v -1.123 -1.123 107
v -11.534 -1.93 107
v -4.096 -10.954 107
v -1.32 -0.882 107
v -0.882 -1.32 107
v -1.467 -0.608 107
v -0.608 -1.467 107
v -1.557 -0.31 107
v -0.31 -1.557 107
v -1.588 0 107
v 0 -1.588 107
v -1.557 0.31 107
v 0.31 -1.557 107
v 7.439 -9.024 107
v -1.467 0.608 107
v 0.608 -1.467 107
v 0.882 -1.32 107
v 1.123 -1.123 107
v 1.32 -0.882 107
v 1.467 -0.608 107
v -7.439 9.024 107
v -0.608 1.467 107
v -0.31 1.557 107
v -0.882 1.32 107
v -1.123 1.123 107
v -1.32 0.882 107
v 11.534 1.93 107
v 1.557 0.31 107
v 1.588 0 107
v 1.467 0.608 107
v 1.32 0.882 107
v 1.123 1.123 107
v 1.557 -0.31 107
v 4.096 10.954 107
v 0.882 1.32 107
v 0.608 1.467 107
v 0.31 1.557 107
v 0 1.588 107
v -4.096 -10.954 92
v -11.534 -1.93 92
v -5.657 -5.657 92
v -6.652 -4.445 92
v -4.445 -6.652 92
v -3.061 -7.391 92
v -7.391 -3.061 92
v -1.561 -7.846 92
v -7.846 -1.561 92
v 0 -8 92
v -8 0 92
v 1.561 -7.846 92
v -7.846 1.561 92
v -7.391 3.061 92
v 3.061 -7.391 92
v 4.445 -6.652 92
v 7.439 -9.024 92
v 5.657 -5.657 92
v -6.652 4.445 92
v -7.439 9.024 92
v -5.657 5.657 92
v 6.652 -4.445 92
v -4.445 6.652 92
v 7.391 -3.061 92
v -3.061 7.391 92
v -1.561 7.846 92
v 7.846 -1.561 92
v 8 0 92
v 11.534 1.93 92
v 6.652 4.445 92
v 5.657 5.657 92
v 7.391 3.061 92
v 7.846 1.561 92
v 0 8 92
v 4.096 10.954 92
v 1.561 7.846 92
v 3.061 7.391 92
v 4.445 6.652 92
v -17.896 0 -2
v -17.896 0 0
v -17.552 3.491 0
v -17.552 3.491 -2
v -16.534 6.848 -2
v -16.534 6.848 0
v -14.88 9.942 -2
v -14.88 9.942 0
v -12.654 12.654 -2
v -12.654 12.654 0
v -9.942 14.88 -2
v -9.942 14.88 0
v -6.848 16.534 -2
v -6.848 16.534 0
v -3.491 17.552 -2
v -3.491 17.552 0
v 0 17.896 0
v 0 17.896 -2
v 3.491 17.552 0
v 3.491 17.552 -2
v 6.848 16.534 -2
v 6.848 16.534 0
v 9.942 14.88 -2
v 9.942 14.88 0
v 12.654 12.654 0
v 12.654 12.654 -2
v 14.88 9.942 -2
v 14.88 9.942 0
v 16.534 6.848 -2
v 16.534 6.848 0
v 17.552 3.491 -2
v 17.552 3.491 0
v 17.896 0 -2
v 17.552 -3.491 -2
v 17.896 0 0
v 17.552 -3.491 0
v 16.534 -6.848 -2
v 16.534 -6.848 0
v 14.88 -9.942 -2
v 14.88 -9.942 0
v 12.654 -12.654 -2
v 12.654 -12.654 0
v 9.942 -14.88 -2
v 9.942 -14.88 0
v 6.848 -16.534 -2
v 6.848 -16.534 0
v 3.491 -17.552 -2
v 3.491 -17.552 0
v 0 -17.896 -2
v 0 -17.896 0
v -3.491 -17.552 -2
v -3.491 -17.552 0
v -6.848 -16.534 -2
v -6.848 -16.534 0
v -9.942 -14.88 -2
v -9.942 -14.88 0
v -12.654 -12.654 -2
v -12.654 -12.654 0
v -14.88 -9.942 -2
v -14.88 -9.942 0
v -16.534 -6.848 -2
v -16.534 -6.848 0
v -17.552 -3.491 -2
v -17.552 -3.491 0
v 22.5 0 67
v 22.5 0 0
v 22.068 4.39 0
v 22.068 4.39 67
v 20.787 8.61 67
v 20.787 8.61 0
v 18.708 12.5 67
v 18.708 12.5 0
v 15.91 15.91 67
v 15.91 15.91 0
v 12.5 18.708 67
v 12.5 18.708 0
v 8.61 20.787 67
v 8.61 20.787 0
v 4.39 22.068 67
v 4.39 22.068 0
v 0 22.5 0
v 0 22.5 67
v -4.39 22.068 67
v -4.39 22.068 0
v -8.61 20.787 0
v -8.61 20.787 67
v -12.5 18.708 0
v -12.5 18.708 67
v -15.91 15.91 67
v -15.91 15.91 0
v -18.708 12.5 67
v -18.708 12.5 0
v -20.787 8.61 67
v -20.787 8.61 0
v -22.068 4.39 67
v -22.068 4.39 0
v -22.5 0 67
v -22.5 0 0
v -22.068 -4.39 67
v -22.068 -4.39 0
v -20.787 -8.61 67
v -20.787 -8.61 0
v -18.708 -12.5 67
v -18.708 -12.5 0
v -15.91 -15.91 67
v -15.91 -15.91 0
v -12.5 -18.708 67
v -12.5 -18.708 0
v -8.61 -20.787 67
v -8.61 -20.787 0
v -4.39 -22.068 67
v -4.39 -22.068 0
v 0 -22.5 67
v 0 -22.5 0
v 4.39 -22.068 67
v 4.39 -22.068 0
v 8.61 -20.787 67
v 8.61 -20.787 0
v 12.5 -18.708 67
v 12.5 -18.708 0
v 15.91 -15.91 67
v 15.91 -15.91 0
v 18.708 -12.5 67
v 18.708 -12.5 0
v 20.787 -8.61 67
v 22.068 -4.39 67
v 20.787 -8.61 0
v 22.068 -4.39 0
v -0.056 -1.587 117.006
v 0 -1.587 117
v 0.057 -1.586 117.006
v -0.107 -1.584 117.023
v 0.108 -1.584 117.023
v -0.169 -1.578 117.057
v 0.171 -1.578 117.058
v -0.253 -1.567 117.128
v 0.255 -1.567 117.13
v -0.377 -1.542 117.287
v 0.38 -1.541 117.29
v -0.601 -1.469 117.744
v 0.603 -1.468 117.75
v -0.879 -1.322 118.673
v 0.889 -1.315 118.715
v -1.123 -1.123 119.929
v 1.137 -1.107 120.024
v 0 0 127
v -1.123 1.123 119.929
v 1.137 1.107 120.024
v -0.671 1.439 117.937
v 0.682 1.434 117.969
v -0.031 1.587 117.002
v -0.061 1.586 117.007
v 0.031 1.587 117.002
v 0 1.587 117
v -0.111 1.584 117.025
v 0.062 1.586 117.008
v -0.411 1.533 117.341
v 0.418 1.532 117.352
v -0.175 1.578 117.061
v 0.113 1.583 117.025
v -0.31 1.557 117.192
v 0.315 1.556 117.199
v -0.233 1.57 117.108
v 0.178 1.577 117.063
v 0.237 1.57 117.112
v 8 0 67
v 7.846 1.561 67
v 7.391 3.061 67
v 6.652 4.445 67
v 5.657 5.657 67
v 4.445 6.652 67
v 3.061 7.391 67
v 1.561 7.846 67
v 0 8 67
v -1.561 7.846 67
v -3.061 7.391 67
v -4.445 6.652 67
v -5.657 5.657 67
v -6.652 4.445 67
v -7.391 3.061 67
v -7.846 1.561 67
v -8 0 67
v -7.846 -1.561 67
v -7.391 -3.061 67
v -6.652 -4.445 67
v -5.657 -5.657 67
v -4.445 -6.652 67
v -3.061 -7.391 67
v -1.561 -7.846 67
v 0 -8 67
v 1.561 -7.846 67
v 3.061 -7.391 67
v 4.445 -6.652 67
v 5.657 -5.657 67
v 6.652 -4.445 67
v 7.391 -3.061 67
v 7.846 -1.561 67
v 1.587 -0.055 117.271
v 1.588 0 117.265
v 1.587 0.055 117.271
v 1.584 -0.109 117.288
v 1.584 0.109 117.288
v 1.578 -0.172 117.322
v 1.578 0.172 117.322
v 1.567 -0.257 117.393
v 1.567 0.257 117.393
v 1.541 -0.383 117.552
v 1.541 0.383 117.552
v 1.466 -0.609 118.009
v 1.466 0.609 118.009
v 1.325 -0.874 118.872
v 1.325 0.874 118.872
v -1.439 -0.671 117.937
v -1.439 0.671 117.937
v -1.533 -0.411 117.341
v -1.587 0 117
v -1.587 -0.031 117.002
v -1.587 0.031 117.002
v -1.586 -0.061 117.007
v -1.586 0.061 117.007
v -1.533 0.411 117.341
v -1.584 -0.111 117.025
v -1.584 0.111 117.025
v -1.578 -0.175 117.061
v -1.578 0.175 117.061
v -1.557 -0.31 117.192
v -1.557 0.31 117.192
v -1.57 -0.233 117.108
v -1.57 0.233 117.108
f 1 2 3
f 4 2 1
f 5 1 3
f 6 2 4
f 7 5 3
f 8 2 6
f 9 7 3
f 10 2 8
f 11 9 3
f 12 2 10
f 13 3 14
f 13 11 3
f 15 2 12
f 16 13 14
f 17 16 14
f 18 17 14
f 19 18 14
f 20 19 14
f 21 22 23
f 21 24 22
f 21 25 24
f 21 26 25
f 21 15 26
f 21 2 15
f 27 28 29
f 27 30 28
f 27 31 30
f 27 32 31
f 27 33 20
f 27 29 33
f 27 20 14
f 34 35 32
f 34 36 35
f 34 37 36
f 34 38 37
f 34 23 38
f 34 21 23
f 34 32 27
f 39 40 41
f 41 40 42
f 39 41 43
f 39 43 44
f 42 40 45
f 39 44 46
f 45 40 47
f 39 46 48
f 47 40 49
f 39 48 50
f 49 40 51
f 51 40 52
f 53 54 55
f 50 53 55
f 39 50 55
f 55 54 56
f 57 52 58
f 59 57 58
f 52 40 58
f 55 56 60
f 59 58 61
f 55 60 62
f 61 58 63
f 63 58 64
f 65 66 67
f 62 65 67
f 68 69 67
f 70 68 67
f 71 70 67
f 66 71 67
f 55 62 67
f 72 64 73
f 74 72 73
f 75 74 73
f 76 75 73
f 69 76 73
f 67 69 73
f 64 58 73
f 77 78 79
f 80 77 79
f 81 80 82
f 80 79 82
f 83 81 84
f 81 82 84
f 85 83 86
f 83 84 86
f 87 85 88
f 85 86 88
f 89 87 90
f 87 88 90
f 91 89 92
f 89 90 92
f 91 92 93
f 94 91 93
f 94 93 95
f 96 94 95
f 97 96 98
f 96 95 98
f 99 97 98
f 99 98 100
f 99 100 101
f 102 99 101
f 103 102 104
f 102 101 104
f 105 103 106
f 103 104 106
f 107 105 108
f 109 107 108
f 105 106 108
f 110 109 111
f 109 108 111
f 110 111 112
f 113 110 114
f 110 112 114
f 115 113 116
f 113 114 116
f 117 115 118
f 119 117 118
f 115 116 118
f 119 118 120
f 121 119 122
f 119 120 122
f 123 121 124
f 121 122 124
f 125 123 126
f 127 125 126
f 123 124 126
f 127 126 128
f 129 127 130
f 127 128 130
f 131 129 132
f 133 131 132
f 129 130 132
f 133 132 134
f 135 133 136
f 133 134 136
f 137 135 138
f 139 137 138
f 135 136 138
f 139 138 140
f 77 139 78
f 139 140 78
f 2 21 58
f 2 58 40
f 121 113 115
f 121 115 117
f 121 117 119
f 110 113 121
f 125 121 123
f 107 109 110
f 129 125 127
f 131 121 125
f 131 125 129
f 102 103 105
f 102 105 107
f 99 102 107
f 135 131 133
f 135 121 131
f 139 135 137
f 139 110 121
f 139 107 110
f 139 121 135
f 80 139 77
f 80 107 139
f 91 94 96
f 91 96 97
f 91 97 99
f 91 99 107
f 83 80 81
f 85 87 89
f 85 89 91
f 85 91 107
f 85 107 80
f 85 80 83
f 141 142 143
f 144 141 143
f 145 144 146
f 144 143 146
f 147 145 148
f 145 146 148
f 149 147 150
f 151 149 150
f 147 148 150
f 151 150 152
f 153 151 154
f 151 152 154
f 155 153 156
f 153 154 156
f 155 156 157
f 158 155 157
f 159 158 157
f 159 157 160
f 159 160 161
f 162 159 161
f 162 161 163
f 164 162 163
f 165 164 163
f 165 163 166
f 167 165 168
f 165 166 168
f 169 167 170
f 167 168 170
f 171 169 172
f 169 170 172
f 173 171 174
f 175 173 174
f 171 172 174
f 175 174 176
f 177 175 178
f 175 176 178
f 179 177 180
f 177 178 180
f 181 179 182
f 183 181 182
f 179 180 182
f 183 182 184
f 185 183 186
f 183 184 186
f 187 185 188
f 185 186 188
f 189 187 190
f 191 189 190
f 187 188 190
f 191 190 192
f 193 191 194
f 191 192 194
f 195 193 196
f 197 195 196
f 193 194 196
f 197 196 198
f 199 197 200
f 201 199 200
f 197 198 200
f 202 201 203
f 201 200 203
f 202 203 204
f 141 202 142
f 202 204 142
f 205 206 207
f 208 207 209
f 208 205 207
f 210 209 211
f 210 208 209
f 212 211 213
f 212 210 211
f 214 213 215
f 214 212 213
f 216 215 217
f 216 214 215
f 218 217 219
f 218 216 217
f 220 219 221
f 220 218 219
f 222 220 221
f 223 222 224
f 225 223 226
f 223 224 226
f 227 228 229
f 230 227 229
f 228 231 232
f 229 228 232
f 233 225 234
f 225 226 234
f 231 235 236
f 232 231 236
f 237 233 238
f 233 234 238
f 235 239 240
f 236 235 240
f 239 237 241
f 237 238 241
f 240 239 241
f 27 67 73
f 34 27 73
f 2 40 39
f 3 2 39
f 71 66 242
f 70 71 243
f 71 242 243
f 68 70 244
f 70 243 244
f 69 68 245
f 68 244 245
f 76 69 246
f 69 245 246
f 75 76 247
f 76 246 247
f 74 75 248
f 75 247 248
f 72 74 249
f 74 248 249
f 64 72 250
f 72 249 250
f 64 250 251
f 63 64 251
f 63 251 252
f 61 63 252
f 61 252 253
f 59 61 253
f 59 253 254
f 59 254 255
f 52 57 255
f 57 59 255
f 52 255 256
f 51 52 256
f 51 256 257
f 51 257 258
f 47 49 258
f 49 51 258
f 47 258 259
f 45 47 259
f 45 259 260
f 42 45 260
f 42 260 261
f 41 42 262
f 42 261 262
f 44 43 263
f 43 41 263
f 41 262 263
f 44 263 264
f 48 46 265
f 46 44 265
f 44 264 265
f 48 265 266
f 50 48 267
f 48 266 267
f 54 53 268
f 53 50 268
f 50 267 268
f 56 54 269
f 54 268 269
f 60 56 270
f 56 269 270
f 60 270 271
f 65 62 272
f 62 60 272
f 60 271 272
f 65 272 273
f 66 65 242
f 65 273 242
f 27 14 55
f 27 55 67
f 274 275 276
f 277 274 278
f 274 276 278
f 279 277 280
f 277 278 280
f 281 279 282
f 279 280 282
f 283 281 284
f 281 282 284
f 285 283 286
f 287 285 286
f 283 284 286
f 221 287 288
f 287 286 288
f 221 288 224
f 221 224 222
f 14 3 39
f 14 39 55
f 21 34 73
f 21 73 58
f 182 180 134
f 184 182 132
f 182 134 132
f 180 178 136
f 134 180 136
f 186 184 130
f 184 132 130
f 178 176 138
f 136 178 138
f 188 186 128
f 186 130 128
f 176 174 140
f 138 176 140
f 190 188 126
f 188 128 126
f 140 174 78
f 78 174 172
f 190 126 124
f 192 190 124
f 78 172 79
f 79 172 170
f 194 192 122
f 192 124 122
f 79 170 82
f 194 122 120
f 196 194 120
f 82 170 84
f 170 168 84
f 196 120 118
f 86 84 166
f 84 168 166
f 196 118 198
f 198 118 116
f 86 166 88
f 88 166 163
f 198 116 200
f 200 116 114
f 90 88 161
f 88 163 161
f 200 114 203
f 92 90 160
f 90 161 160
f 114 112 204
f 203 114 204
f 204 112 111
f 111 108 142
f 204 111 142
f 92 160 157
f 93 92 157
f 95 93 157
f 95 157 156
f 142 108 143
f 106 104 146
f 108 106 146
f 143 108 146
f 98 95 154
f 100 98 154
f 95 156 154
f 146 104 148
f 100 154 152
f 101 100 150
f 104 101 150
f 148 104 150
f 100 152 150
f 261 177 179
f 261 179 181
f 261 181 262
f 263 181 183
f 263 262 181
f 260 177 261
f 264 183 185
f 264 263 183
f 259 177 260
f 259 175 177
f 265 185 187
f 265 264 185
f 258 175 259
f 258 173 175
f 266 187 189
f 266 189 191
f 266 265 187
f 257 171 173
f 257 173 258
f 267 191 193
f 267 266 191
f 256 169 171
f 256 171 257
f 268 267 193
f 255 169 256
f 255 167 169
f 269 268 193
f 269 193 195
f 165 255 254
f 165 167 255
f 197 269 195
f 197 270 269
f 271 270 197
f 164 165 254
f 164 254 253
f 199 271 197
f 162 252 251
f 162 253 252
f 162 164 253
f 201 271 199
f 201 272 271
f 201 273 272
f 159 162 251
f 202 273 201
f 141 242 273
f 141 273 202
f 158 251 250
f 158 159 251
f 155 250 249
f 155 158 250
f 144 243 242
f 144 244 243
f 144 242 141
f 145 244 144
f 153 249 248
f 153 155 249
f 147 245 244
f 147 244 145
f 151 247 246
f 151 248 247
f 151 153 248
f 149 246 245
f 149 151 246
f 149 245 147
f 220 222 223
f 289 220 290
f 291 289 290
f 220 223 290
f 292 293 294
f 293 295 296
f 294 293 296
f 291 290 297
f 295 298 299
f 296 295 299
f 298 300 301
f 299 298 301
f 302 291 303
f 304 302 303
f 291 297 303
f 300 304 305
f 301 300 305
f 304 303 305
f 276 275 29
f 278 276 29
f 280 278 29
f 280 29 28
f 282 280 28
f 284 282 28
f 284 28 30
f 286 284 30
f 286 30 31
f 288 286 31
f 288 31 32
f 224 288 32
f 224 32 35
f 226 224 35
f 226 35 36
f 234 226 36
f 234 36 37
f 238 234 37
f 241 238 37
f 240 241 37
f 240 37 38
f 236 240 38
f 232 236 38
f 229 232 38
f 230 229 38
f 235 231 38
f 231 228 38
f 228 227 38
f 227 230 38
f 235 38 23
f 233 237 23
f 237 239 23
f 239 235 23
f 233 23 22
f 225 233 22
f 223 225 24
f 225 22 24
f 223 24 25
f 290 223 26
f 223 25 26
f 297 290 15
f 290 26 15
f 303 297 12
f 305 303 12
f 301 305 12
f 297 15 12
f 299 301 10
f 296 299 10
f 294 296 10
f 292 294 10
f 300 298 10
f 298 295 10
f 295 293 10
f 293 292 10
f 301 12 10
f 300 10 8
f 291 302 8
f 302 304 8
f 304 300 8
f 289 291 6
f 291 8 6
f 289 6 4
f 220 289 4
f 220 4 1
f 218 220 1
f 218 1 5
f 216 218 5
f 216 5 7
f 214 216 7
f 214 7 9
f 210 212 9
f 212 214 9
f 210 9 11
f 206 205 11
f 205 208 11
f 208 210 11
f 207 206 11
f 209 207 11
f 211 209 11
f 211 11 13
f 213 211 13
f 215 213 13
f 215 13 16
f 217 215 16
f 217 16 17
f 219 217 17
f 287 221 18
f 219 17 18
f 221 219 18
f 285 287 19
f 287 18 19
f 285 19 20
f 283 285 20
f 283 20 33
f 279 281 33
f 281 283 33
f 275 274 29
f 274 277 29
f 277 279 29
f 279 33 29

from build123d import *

# Parameters (mm, degrees)
SKETCH1_R                      = 22.5
BOSS_EXTRUDE1_DEPTH            = 67
SKETCH2_R                      = 8
BOSS_EXTRUDE2_DEPTH            = 40
BOSS_EXTRUDE3_DEPTH            = 15
SKETCH4_R                      = 1.5875
BOSS_EXTRUDE4_DEPTH            = 20
CUT_EXTRUDE1_REACH             = 24.5
CUT_EXTRUDE1_DIRECTION_2_REACH = 24.5
CUT_EXTRUDE2_REACH             = 24.5
CUT_EXTRUDE2_DIRECTION_2_REACH = 24.5
SKETCH7_R                      = 17.895926968
BOSS_EXTRUDE5_DEPTH            = 2


with BuildPart() as part:
    # Sketch1 → Boss-Extrude1 (new body)
    with BuildSketch(Plane.XY):
        Circle(SKETCH1_R)
    extrude(amount=BOSS_EXTRUDE1_DEPTH)

    # Sketch2 → Boss-Extrude2 (add)
    with BuildSketch(Plane.XY.offset(67)):
        Circle(SKETCH2_R)
    extrude(amount=BOSS_EXTRUDE2_DEPTH)

    # Sketch3 → Boss-Extrude3 (add)
    with BuildSketch(Plane.XY.offset(107)):
        Polygon((11.534146379, 1.930154149), (4.095510664, 10.95394085), (-7.438635716, 9.023786701), (-11.534146379, -1.930154149), (-4.095510664, -10.95394085), (7.438635716, -9.023786701), align=None)
    extrude(amount=-BOSS_EXTRUDE3_DEPTH)

    # Sketch4 → Boss-Extrude4 (add)
    with BuildSketch(Plane.XY.offset(107)):
        Circle(SKETCH4_R)
    extrude(amount=BOSS_EXTRUDE4_DEPTH)

    # Sketch5 → Cut-Extrude1 (cut, up to next)
    with BuildSketch(Plane(origin=(0, 0, 0), x_dir=(1, 0, 0), z_dir=(0, 1, 0)), mode=Mode.PRIVATE) as cut_extrude1_sk1:
        Polygon((-1.5875, -127), (0, -127), (-1.5875, -117), align=None)
    cut_extrude1_tool1 = extrude(cut_extrude1_sk1.sketch, amount=-CUT_EXTRUDE1_REACH, mode=Mode.PRIVATE) & part.part
    add(cut_extrude1_tool1.solids().sort_by_distance((-1.058333, 0, 123.666667))[0], mode=Mode.SUBTRACT)
    # Sketch5 → Cut-Extrude1 (cut, up to next)
    with BuildSketch(Plane(origin=(0, 0, 0), x_dir=(1, 0, 0), z_dir=(0, 1, 0)), mode=Mode.PRIVATE) as cut_extrude1_sk2:
        Polygon((1.630697713, -117), (0, -127), (1.5875, -127), align=None)
    cut_extrude1_tool2 = extrude(cut_extrude1_sk2.sketch, amount=-CUT_EXTRUDE1_REACH, mode=Mode.PRIVATE) & part.part
    add(cut_extrude1_tool2.solids().sort_by_distance((1.072733, 0, 123.666667))[0], mode=Mode.SUBTRACT)

    # Sketch5 → Cut-Extrude1 direction 2 (cut, up to next)
    with BuildSketch(Plane(origin=(0, 0, 0), x_dir=(1, 0, 0), z_dir=(0, 1, 0)), mode=Mode.PRIVATE) as cut_extrude1_direction_2_sk1:
        Polygon((-1.5875, -127), (0, -127), (-1.5875, -117), align=None)
    cut_extrude1_direction_2_tool1 = extrude(cut_extrude1_direction_2_sk1.sketch, amount=CUT_EXTRUDE1_DIRECTION_2_REACH, mode=Mode.PRIVATE) & part.part
    add(cut_extrude1_direction_2_tool1.solids().sort_by_distance((-1.058333, 0, 123.666667))[0], mode=Mode.SUBTRACT)
    # Sketch5 → Cut-Extrude1 direction 2 (cut, up to next)
    with BuildSketch(Plane(origin=(0, 0, 0), x_dir=(1, 0, 0), z_dir=(0, 1, 0)), mode=Mode.PRIVATE) as cut_extrude1_direction_2_sk2:
        Polygon((1.630697713, -117), (0, -127), (1.5875, -127), align=None)
    cut_extrude1_direction_2_tool2 = extrude(cut_extrude1_direction_2_sk2.sketch, amount=CUT_EXTRUDE1_DIRECTION_2_REACH, mode=Mode.PRIVATE) & part.part
    add(cut_extrude1_direction_2_tool2.solids().sort_by_distance((1.072733, 0, 123.666667))[0], mode=Mode.SUBTRACT)

    # Sketch6 → Cut-Extrude2 (cut, up to next)
    with BuildSketch(Plane(origin=(0, 0, 0), x_dir=(0, 0, -1), z_dir=(1, 0, 0)), mode=Mode.PRIVATE) as cut_extrude2_sk1:
        Polygon((-127, -1.5875), (-117, -1.5875), (-127, 0), align=None)
    cut_extrude2_tool1 = extrude(cut_extrude2_sk1.sketch, amount=-CUT_EXTRUDE2_REACH, mode=Mode.PRIVATE) & part.part
    add(cut_extrude2_tool1.solids().sort_by_distance((0, -1.058333, 123.666667))[0], mode=Mode.SUBTRACT)
    # Sketch6 → Cut-Extrude2 (cut, up to next)
    with BuildSketch(Plane(origin=(0, 0, 0), x_dir=(0, 0, -1), z_dir=(1, 0, 0)), mode=Mode.PRIVATE) as cut_extrude2_sk2:
        Polygon((-127, 0), (-117, 1.5875), (-127, 1.5875), align=None)
    cut_extrude2_tool2 = extrude(cut_extrude2_sk2.sketch, amount=-CUT_EXTRUDE2_REACH, mode=Mode.PRIVATE) & part.part
    add(cut_extrude2_tool2.solids().sort_by_distance((0, 1.058333, 123.666667))[0], mode=Mode.SUBTRACT)

    # Sketch6 → Cut-Extrude2 direction 2 (cut, up to next)
    with BuildSketch(Plane(origin=(0, 0, 0), x_dir=(0, 0, -1), z_dir=(1, 0, 0)), mode=Mode.PRIVATE) as cut_extrude2_direction_2_sk1:
        Polygon((-127, -1.5875), (-117, -1.5875), (-127, 0), align=None)
    cut_extrude2_direction_2_tool1 = extrude(cut_extrude2_direction_2_sk1.sketch, amount=CUT_EXTRUDE2_DIRECTION_2_REACH, mode=Mode.PRIVATE) & part.part
    add(cut_extrude2_direction_2_tool1.solids().sort_by_distance((0, -1.058333, 123.666667))[0], mode=Mode.SUBTRACT)
    # Sketch6 → Cut-Extrude2 direction 2 (cut, up to next)
    with BuildSketch(Plane(origin=(0, 0, 0), x_dir=(0, 0, -1), z_dir=(1, 0, 0)), mode=Mode.PRIVATE) as cut_extrude2_direction_2_sk2:
        Polygon((-127, 0), (-117, 1.5875), (-127, 1.5875), align=None)
    cut_extrude2_direction_2_tool2 = extrude(cut_extrude2_direction_2_sk2.sketch, amount=CUT_EXTRUDE2_DIRECTION_2_REACH, mode=Mode.PRIVATE) & part.part
    add(cut_extrude2_direction_2_tool2.solids().sort_by_distance((0, 1.058333, 123.666667))[0], mode=Mode.SUBTRACT)

    # Sketch7 → Boss-Extrude5 (add)
    with BuildSketch(Plane(origin=(0, 0, 0), x_dir=(-1, 0, 0), z_dir=(0, 0, -1))):
        Circle(SKETCH7_R)
    extrude(amount=BOSS_EXTRUDE5_DEPTH)


solid = part.part
